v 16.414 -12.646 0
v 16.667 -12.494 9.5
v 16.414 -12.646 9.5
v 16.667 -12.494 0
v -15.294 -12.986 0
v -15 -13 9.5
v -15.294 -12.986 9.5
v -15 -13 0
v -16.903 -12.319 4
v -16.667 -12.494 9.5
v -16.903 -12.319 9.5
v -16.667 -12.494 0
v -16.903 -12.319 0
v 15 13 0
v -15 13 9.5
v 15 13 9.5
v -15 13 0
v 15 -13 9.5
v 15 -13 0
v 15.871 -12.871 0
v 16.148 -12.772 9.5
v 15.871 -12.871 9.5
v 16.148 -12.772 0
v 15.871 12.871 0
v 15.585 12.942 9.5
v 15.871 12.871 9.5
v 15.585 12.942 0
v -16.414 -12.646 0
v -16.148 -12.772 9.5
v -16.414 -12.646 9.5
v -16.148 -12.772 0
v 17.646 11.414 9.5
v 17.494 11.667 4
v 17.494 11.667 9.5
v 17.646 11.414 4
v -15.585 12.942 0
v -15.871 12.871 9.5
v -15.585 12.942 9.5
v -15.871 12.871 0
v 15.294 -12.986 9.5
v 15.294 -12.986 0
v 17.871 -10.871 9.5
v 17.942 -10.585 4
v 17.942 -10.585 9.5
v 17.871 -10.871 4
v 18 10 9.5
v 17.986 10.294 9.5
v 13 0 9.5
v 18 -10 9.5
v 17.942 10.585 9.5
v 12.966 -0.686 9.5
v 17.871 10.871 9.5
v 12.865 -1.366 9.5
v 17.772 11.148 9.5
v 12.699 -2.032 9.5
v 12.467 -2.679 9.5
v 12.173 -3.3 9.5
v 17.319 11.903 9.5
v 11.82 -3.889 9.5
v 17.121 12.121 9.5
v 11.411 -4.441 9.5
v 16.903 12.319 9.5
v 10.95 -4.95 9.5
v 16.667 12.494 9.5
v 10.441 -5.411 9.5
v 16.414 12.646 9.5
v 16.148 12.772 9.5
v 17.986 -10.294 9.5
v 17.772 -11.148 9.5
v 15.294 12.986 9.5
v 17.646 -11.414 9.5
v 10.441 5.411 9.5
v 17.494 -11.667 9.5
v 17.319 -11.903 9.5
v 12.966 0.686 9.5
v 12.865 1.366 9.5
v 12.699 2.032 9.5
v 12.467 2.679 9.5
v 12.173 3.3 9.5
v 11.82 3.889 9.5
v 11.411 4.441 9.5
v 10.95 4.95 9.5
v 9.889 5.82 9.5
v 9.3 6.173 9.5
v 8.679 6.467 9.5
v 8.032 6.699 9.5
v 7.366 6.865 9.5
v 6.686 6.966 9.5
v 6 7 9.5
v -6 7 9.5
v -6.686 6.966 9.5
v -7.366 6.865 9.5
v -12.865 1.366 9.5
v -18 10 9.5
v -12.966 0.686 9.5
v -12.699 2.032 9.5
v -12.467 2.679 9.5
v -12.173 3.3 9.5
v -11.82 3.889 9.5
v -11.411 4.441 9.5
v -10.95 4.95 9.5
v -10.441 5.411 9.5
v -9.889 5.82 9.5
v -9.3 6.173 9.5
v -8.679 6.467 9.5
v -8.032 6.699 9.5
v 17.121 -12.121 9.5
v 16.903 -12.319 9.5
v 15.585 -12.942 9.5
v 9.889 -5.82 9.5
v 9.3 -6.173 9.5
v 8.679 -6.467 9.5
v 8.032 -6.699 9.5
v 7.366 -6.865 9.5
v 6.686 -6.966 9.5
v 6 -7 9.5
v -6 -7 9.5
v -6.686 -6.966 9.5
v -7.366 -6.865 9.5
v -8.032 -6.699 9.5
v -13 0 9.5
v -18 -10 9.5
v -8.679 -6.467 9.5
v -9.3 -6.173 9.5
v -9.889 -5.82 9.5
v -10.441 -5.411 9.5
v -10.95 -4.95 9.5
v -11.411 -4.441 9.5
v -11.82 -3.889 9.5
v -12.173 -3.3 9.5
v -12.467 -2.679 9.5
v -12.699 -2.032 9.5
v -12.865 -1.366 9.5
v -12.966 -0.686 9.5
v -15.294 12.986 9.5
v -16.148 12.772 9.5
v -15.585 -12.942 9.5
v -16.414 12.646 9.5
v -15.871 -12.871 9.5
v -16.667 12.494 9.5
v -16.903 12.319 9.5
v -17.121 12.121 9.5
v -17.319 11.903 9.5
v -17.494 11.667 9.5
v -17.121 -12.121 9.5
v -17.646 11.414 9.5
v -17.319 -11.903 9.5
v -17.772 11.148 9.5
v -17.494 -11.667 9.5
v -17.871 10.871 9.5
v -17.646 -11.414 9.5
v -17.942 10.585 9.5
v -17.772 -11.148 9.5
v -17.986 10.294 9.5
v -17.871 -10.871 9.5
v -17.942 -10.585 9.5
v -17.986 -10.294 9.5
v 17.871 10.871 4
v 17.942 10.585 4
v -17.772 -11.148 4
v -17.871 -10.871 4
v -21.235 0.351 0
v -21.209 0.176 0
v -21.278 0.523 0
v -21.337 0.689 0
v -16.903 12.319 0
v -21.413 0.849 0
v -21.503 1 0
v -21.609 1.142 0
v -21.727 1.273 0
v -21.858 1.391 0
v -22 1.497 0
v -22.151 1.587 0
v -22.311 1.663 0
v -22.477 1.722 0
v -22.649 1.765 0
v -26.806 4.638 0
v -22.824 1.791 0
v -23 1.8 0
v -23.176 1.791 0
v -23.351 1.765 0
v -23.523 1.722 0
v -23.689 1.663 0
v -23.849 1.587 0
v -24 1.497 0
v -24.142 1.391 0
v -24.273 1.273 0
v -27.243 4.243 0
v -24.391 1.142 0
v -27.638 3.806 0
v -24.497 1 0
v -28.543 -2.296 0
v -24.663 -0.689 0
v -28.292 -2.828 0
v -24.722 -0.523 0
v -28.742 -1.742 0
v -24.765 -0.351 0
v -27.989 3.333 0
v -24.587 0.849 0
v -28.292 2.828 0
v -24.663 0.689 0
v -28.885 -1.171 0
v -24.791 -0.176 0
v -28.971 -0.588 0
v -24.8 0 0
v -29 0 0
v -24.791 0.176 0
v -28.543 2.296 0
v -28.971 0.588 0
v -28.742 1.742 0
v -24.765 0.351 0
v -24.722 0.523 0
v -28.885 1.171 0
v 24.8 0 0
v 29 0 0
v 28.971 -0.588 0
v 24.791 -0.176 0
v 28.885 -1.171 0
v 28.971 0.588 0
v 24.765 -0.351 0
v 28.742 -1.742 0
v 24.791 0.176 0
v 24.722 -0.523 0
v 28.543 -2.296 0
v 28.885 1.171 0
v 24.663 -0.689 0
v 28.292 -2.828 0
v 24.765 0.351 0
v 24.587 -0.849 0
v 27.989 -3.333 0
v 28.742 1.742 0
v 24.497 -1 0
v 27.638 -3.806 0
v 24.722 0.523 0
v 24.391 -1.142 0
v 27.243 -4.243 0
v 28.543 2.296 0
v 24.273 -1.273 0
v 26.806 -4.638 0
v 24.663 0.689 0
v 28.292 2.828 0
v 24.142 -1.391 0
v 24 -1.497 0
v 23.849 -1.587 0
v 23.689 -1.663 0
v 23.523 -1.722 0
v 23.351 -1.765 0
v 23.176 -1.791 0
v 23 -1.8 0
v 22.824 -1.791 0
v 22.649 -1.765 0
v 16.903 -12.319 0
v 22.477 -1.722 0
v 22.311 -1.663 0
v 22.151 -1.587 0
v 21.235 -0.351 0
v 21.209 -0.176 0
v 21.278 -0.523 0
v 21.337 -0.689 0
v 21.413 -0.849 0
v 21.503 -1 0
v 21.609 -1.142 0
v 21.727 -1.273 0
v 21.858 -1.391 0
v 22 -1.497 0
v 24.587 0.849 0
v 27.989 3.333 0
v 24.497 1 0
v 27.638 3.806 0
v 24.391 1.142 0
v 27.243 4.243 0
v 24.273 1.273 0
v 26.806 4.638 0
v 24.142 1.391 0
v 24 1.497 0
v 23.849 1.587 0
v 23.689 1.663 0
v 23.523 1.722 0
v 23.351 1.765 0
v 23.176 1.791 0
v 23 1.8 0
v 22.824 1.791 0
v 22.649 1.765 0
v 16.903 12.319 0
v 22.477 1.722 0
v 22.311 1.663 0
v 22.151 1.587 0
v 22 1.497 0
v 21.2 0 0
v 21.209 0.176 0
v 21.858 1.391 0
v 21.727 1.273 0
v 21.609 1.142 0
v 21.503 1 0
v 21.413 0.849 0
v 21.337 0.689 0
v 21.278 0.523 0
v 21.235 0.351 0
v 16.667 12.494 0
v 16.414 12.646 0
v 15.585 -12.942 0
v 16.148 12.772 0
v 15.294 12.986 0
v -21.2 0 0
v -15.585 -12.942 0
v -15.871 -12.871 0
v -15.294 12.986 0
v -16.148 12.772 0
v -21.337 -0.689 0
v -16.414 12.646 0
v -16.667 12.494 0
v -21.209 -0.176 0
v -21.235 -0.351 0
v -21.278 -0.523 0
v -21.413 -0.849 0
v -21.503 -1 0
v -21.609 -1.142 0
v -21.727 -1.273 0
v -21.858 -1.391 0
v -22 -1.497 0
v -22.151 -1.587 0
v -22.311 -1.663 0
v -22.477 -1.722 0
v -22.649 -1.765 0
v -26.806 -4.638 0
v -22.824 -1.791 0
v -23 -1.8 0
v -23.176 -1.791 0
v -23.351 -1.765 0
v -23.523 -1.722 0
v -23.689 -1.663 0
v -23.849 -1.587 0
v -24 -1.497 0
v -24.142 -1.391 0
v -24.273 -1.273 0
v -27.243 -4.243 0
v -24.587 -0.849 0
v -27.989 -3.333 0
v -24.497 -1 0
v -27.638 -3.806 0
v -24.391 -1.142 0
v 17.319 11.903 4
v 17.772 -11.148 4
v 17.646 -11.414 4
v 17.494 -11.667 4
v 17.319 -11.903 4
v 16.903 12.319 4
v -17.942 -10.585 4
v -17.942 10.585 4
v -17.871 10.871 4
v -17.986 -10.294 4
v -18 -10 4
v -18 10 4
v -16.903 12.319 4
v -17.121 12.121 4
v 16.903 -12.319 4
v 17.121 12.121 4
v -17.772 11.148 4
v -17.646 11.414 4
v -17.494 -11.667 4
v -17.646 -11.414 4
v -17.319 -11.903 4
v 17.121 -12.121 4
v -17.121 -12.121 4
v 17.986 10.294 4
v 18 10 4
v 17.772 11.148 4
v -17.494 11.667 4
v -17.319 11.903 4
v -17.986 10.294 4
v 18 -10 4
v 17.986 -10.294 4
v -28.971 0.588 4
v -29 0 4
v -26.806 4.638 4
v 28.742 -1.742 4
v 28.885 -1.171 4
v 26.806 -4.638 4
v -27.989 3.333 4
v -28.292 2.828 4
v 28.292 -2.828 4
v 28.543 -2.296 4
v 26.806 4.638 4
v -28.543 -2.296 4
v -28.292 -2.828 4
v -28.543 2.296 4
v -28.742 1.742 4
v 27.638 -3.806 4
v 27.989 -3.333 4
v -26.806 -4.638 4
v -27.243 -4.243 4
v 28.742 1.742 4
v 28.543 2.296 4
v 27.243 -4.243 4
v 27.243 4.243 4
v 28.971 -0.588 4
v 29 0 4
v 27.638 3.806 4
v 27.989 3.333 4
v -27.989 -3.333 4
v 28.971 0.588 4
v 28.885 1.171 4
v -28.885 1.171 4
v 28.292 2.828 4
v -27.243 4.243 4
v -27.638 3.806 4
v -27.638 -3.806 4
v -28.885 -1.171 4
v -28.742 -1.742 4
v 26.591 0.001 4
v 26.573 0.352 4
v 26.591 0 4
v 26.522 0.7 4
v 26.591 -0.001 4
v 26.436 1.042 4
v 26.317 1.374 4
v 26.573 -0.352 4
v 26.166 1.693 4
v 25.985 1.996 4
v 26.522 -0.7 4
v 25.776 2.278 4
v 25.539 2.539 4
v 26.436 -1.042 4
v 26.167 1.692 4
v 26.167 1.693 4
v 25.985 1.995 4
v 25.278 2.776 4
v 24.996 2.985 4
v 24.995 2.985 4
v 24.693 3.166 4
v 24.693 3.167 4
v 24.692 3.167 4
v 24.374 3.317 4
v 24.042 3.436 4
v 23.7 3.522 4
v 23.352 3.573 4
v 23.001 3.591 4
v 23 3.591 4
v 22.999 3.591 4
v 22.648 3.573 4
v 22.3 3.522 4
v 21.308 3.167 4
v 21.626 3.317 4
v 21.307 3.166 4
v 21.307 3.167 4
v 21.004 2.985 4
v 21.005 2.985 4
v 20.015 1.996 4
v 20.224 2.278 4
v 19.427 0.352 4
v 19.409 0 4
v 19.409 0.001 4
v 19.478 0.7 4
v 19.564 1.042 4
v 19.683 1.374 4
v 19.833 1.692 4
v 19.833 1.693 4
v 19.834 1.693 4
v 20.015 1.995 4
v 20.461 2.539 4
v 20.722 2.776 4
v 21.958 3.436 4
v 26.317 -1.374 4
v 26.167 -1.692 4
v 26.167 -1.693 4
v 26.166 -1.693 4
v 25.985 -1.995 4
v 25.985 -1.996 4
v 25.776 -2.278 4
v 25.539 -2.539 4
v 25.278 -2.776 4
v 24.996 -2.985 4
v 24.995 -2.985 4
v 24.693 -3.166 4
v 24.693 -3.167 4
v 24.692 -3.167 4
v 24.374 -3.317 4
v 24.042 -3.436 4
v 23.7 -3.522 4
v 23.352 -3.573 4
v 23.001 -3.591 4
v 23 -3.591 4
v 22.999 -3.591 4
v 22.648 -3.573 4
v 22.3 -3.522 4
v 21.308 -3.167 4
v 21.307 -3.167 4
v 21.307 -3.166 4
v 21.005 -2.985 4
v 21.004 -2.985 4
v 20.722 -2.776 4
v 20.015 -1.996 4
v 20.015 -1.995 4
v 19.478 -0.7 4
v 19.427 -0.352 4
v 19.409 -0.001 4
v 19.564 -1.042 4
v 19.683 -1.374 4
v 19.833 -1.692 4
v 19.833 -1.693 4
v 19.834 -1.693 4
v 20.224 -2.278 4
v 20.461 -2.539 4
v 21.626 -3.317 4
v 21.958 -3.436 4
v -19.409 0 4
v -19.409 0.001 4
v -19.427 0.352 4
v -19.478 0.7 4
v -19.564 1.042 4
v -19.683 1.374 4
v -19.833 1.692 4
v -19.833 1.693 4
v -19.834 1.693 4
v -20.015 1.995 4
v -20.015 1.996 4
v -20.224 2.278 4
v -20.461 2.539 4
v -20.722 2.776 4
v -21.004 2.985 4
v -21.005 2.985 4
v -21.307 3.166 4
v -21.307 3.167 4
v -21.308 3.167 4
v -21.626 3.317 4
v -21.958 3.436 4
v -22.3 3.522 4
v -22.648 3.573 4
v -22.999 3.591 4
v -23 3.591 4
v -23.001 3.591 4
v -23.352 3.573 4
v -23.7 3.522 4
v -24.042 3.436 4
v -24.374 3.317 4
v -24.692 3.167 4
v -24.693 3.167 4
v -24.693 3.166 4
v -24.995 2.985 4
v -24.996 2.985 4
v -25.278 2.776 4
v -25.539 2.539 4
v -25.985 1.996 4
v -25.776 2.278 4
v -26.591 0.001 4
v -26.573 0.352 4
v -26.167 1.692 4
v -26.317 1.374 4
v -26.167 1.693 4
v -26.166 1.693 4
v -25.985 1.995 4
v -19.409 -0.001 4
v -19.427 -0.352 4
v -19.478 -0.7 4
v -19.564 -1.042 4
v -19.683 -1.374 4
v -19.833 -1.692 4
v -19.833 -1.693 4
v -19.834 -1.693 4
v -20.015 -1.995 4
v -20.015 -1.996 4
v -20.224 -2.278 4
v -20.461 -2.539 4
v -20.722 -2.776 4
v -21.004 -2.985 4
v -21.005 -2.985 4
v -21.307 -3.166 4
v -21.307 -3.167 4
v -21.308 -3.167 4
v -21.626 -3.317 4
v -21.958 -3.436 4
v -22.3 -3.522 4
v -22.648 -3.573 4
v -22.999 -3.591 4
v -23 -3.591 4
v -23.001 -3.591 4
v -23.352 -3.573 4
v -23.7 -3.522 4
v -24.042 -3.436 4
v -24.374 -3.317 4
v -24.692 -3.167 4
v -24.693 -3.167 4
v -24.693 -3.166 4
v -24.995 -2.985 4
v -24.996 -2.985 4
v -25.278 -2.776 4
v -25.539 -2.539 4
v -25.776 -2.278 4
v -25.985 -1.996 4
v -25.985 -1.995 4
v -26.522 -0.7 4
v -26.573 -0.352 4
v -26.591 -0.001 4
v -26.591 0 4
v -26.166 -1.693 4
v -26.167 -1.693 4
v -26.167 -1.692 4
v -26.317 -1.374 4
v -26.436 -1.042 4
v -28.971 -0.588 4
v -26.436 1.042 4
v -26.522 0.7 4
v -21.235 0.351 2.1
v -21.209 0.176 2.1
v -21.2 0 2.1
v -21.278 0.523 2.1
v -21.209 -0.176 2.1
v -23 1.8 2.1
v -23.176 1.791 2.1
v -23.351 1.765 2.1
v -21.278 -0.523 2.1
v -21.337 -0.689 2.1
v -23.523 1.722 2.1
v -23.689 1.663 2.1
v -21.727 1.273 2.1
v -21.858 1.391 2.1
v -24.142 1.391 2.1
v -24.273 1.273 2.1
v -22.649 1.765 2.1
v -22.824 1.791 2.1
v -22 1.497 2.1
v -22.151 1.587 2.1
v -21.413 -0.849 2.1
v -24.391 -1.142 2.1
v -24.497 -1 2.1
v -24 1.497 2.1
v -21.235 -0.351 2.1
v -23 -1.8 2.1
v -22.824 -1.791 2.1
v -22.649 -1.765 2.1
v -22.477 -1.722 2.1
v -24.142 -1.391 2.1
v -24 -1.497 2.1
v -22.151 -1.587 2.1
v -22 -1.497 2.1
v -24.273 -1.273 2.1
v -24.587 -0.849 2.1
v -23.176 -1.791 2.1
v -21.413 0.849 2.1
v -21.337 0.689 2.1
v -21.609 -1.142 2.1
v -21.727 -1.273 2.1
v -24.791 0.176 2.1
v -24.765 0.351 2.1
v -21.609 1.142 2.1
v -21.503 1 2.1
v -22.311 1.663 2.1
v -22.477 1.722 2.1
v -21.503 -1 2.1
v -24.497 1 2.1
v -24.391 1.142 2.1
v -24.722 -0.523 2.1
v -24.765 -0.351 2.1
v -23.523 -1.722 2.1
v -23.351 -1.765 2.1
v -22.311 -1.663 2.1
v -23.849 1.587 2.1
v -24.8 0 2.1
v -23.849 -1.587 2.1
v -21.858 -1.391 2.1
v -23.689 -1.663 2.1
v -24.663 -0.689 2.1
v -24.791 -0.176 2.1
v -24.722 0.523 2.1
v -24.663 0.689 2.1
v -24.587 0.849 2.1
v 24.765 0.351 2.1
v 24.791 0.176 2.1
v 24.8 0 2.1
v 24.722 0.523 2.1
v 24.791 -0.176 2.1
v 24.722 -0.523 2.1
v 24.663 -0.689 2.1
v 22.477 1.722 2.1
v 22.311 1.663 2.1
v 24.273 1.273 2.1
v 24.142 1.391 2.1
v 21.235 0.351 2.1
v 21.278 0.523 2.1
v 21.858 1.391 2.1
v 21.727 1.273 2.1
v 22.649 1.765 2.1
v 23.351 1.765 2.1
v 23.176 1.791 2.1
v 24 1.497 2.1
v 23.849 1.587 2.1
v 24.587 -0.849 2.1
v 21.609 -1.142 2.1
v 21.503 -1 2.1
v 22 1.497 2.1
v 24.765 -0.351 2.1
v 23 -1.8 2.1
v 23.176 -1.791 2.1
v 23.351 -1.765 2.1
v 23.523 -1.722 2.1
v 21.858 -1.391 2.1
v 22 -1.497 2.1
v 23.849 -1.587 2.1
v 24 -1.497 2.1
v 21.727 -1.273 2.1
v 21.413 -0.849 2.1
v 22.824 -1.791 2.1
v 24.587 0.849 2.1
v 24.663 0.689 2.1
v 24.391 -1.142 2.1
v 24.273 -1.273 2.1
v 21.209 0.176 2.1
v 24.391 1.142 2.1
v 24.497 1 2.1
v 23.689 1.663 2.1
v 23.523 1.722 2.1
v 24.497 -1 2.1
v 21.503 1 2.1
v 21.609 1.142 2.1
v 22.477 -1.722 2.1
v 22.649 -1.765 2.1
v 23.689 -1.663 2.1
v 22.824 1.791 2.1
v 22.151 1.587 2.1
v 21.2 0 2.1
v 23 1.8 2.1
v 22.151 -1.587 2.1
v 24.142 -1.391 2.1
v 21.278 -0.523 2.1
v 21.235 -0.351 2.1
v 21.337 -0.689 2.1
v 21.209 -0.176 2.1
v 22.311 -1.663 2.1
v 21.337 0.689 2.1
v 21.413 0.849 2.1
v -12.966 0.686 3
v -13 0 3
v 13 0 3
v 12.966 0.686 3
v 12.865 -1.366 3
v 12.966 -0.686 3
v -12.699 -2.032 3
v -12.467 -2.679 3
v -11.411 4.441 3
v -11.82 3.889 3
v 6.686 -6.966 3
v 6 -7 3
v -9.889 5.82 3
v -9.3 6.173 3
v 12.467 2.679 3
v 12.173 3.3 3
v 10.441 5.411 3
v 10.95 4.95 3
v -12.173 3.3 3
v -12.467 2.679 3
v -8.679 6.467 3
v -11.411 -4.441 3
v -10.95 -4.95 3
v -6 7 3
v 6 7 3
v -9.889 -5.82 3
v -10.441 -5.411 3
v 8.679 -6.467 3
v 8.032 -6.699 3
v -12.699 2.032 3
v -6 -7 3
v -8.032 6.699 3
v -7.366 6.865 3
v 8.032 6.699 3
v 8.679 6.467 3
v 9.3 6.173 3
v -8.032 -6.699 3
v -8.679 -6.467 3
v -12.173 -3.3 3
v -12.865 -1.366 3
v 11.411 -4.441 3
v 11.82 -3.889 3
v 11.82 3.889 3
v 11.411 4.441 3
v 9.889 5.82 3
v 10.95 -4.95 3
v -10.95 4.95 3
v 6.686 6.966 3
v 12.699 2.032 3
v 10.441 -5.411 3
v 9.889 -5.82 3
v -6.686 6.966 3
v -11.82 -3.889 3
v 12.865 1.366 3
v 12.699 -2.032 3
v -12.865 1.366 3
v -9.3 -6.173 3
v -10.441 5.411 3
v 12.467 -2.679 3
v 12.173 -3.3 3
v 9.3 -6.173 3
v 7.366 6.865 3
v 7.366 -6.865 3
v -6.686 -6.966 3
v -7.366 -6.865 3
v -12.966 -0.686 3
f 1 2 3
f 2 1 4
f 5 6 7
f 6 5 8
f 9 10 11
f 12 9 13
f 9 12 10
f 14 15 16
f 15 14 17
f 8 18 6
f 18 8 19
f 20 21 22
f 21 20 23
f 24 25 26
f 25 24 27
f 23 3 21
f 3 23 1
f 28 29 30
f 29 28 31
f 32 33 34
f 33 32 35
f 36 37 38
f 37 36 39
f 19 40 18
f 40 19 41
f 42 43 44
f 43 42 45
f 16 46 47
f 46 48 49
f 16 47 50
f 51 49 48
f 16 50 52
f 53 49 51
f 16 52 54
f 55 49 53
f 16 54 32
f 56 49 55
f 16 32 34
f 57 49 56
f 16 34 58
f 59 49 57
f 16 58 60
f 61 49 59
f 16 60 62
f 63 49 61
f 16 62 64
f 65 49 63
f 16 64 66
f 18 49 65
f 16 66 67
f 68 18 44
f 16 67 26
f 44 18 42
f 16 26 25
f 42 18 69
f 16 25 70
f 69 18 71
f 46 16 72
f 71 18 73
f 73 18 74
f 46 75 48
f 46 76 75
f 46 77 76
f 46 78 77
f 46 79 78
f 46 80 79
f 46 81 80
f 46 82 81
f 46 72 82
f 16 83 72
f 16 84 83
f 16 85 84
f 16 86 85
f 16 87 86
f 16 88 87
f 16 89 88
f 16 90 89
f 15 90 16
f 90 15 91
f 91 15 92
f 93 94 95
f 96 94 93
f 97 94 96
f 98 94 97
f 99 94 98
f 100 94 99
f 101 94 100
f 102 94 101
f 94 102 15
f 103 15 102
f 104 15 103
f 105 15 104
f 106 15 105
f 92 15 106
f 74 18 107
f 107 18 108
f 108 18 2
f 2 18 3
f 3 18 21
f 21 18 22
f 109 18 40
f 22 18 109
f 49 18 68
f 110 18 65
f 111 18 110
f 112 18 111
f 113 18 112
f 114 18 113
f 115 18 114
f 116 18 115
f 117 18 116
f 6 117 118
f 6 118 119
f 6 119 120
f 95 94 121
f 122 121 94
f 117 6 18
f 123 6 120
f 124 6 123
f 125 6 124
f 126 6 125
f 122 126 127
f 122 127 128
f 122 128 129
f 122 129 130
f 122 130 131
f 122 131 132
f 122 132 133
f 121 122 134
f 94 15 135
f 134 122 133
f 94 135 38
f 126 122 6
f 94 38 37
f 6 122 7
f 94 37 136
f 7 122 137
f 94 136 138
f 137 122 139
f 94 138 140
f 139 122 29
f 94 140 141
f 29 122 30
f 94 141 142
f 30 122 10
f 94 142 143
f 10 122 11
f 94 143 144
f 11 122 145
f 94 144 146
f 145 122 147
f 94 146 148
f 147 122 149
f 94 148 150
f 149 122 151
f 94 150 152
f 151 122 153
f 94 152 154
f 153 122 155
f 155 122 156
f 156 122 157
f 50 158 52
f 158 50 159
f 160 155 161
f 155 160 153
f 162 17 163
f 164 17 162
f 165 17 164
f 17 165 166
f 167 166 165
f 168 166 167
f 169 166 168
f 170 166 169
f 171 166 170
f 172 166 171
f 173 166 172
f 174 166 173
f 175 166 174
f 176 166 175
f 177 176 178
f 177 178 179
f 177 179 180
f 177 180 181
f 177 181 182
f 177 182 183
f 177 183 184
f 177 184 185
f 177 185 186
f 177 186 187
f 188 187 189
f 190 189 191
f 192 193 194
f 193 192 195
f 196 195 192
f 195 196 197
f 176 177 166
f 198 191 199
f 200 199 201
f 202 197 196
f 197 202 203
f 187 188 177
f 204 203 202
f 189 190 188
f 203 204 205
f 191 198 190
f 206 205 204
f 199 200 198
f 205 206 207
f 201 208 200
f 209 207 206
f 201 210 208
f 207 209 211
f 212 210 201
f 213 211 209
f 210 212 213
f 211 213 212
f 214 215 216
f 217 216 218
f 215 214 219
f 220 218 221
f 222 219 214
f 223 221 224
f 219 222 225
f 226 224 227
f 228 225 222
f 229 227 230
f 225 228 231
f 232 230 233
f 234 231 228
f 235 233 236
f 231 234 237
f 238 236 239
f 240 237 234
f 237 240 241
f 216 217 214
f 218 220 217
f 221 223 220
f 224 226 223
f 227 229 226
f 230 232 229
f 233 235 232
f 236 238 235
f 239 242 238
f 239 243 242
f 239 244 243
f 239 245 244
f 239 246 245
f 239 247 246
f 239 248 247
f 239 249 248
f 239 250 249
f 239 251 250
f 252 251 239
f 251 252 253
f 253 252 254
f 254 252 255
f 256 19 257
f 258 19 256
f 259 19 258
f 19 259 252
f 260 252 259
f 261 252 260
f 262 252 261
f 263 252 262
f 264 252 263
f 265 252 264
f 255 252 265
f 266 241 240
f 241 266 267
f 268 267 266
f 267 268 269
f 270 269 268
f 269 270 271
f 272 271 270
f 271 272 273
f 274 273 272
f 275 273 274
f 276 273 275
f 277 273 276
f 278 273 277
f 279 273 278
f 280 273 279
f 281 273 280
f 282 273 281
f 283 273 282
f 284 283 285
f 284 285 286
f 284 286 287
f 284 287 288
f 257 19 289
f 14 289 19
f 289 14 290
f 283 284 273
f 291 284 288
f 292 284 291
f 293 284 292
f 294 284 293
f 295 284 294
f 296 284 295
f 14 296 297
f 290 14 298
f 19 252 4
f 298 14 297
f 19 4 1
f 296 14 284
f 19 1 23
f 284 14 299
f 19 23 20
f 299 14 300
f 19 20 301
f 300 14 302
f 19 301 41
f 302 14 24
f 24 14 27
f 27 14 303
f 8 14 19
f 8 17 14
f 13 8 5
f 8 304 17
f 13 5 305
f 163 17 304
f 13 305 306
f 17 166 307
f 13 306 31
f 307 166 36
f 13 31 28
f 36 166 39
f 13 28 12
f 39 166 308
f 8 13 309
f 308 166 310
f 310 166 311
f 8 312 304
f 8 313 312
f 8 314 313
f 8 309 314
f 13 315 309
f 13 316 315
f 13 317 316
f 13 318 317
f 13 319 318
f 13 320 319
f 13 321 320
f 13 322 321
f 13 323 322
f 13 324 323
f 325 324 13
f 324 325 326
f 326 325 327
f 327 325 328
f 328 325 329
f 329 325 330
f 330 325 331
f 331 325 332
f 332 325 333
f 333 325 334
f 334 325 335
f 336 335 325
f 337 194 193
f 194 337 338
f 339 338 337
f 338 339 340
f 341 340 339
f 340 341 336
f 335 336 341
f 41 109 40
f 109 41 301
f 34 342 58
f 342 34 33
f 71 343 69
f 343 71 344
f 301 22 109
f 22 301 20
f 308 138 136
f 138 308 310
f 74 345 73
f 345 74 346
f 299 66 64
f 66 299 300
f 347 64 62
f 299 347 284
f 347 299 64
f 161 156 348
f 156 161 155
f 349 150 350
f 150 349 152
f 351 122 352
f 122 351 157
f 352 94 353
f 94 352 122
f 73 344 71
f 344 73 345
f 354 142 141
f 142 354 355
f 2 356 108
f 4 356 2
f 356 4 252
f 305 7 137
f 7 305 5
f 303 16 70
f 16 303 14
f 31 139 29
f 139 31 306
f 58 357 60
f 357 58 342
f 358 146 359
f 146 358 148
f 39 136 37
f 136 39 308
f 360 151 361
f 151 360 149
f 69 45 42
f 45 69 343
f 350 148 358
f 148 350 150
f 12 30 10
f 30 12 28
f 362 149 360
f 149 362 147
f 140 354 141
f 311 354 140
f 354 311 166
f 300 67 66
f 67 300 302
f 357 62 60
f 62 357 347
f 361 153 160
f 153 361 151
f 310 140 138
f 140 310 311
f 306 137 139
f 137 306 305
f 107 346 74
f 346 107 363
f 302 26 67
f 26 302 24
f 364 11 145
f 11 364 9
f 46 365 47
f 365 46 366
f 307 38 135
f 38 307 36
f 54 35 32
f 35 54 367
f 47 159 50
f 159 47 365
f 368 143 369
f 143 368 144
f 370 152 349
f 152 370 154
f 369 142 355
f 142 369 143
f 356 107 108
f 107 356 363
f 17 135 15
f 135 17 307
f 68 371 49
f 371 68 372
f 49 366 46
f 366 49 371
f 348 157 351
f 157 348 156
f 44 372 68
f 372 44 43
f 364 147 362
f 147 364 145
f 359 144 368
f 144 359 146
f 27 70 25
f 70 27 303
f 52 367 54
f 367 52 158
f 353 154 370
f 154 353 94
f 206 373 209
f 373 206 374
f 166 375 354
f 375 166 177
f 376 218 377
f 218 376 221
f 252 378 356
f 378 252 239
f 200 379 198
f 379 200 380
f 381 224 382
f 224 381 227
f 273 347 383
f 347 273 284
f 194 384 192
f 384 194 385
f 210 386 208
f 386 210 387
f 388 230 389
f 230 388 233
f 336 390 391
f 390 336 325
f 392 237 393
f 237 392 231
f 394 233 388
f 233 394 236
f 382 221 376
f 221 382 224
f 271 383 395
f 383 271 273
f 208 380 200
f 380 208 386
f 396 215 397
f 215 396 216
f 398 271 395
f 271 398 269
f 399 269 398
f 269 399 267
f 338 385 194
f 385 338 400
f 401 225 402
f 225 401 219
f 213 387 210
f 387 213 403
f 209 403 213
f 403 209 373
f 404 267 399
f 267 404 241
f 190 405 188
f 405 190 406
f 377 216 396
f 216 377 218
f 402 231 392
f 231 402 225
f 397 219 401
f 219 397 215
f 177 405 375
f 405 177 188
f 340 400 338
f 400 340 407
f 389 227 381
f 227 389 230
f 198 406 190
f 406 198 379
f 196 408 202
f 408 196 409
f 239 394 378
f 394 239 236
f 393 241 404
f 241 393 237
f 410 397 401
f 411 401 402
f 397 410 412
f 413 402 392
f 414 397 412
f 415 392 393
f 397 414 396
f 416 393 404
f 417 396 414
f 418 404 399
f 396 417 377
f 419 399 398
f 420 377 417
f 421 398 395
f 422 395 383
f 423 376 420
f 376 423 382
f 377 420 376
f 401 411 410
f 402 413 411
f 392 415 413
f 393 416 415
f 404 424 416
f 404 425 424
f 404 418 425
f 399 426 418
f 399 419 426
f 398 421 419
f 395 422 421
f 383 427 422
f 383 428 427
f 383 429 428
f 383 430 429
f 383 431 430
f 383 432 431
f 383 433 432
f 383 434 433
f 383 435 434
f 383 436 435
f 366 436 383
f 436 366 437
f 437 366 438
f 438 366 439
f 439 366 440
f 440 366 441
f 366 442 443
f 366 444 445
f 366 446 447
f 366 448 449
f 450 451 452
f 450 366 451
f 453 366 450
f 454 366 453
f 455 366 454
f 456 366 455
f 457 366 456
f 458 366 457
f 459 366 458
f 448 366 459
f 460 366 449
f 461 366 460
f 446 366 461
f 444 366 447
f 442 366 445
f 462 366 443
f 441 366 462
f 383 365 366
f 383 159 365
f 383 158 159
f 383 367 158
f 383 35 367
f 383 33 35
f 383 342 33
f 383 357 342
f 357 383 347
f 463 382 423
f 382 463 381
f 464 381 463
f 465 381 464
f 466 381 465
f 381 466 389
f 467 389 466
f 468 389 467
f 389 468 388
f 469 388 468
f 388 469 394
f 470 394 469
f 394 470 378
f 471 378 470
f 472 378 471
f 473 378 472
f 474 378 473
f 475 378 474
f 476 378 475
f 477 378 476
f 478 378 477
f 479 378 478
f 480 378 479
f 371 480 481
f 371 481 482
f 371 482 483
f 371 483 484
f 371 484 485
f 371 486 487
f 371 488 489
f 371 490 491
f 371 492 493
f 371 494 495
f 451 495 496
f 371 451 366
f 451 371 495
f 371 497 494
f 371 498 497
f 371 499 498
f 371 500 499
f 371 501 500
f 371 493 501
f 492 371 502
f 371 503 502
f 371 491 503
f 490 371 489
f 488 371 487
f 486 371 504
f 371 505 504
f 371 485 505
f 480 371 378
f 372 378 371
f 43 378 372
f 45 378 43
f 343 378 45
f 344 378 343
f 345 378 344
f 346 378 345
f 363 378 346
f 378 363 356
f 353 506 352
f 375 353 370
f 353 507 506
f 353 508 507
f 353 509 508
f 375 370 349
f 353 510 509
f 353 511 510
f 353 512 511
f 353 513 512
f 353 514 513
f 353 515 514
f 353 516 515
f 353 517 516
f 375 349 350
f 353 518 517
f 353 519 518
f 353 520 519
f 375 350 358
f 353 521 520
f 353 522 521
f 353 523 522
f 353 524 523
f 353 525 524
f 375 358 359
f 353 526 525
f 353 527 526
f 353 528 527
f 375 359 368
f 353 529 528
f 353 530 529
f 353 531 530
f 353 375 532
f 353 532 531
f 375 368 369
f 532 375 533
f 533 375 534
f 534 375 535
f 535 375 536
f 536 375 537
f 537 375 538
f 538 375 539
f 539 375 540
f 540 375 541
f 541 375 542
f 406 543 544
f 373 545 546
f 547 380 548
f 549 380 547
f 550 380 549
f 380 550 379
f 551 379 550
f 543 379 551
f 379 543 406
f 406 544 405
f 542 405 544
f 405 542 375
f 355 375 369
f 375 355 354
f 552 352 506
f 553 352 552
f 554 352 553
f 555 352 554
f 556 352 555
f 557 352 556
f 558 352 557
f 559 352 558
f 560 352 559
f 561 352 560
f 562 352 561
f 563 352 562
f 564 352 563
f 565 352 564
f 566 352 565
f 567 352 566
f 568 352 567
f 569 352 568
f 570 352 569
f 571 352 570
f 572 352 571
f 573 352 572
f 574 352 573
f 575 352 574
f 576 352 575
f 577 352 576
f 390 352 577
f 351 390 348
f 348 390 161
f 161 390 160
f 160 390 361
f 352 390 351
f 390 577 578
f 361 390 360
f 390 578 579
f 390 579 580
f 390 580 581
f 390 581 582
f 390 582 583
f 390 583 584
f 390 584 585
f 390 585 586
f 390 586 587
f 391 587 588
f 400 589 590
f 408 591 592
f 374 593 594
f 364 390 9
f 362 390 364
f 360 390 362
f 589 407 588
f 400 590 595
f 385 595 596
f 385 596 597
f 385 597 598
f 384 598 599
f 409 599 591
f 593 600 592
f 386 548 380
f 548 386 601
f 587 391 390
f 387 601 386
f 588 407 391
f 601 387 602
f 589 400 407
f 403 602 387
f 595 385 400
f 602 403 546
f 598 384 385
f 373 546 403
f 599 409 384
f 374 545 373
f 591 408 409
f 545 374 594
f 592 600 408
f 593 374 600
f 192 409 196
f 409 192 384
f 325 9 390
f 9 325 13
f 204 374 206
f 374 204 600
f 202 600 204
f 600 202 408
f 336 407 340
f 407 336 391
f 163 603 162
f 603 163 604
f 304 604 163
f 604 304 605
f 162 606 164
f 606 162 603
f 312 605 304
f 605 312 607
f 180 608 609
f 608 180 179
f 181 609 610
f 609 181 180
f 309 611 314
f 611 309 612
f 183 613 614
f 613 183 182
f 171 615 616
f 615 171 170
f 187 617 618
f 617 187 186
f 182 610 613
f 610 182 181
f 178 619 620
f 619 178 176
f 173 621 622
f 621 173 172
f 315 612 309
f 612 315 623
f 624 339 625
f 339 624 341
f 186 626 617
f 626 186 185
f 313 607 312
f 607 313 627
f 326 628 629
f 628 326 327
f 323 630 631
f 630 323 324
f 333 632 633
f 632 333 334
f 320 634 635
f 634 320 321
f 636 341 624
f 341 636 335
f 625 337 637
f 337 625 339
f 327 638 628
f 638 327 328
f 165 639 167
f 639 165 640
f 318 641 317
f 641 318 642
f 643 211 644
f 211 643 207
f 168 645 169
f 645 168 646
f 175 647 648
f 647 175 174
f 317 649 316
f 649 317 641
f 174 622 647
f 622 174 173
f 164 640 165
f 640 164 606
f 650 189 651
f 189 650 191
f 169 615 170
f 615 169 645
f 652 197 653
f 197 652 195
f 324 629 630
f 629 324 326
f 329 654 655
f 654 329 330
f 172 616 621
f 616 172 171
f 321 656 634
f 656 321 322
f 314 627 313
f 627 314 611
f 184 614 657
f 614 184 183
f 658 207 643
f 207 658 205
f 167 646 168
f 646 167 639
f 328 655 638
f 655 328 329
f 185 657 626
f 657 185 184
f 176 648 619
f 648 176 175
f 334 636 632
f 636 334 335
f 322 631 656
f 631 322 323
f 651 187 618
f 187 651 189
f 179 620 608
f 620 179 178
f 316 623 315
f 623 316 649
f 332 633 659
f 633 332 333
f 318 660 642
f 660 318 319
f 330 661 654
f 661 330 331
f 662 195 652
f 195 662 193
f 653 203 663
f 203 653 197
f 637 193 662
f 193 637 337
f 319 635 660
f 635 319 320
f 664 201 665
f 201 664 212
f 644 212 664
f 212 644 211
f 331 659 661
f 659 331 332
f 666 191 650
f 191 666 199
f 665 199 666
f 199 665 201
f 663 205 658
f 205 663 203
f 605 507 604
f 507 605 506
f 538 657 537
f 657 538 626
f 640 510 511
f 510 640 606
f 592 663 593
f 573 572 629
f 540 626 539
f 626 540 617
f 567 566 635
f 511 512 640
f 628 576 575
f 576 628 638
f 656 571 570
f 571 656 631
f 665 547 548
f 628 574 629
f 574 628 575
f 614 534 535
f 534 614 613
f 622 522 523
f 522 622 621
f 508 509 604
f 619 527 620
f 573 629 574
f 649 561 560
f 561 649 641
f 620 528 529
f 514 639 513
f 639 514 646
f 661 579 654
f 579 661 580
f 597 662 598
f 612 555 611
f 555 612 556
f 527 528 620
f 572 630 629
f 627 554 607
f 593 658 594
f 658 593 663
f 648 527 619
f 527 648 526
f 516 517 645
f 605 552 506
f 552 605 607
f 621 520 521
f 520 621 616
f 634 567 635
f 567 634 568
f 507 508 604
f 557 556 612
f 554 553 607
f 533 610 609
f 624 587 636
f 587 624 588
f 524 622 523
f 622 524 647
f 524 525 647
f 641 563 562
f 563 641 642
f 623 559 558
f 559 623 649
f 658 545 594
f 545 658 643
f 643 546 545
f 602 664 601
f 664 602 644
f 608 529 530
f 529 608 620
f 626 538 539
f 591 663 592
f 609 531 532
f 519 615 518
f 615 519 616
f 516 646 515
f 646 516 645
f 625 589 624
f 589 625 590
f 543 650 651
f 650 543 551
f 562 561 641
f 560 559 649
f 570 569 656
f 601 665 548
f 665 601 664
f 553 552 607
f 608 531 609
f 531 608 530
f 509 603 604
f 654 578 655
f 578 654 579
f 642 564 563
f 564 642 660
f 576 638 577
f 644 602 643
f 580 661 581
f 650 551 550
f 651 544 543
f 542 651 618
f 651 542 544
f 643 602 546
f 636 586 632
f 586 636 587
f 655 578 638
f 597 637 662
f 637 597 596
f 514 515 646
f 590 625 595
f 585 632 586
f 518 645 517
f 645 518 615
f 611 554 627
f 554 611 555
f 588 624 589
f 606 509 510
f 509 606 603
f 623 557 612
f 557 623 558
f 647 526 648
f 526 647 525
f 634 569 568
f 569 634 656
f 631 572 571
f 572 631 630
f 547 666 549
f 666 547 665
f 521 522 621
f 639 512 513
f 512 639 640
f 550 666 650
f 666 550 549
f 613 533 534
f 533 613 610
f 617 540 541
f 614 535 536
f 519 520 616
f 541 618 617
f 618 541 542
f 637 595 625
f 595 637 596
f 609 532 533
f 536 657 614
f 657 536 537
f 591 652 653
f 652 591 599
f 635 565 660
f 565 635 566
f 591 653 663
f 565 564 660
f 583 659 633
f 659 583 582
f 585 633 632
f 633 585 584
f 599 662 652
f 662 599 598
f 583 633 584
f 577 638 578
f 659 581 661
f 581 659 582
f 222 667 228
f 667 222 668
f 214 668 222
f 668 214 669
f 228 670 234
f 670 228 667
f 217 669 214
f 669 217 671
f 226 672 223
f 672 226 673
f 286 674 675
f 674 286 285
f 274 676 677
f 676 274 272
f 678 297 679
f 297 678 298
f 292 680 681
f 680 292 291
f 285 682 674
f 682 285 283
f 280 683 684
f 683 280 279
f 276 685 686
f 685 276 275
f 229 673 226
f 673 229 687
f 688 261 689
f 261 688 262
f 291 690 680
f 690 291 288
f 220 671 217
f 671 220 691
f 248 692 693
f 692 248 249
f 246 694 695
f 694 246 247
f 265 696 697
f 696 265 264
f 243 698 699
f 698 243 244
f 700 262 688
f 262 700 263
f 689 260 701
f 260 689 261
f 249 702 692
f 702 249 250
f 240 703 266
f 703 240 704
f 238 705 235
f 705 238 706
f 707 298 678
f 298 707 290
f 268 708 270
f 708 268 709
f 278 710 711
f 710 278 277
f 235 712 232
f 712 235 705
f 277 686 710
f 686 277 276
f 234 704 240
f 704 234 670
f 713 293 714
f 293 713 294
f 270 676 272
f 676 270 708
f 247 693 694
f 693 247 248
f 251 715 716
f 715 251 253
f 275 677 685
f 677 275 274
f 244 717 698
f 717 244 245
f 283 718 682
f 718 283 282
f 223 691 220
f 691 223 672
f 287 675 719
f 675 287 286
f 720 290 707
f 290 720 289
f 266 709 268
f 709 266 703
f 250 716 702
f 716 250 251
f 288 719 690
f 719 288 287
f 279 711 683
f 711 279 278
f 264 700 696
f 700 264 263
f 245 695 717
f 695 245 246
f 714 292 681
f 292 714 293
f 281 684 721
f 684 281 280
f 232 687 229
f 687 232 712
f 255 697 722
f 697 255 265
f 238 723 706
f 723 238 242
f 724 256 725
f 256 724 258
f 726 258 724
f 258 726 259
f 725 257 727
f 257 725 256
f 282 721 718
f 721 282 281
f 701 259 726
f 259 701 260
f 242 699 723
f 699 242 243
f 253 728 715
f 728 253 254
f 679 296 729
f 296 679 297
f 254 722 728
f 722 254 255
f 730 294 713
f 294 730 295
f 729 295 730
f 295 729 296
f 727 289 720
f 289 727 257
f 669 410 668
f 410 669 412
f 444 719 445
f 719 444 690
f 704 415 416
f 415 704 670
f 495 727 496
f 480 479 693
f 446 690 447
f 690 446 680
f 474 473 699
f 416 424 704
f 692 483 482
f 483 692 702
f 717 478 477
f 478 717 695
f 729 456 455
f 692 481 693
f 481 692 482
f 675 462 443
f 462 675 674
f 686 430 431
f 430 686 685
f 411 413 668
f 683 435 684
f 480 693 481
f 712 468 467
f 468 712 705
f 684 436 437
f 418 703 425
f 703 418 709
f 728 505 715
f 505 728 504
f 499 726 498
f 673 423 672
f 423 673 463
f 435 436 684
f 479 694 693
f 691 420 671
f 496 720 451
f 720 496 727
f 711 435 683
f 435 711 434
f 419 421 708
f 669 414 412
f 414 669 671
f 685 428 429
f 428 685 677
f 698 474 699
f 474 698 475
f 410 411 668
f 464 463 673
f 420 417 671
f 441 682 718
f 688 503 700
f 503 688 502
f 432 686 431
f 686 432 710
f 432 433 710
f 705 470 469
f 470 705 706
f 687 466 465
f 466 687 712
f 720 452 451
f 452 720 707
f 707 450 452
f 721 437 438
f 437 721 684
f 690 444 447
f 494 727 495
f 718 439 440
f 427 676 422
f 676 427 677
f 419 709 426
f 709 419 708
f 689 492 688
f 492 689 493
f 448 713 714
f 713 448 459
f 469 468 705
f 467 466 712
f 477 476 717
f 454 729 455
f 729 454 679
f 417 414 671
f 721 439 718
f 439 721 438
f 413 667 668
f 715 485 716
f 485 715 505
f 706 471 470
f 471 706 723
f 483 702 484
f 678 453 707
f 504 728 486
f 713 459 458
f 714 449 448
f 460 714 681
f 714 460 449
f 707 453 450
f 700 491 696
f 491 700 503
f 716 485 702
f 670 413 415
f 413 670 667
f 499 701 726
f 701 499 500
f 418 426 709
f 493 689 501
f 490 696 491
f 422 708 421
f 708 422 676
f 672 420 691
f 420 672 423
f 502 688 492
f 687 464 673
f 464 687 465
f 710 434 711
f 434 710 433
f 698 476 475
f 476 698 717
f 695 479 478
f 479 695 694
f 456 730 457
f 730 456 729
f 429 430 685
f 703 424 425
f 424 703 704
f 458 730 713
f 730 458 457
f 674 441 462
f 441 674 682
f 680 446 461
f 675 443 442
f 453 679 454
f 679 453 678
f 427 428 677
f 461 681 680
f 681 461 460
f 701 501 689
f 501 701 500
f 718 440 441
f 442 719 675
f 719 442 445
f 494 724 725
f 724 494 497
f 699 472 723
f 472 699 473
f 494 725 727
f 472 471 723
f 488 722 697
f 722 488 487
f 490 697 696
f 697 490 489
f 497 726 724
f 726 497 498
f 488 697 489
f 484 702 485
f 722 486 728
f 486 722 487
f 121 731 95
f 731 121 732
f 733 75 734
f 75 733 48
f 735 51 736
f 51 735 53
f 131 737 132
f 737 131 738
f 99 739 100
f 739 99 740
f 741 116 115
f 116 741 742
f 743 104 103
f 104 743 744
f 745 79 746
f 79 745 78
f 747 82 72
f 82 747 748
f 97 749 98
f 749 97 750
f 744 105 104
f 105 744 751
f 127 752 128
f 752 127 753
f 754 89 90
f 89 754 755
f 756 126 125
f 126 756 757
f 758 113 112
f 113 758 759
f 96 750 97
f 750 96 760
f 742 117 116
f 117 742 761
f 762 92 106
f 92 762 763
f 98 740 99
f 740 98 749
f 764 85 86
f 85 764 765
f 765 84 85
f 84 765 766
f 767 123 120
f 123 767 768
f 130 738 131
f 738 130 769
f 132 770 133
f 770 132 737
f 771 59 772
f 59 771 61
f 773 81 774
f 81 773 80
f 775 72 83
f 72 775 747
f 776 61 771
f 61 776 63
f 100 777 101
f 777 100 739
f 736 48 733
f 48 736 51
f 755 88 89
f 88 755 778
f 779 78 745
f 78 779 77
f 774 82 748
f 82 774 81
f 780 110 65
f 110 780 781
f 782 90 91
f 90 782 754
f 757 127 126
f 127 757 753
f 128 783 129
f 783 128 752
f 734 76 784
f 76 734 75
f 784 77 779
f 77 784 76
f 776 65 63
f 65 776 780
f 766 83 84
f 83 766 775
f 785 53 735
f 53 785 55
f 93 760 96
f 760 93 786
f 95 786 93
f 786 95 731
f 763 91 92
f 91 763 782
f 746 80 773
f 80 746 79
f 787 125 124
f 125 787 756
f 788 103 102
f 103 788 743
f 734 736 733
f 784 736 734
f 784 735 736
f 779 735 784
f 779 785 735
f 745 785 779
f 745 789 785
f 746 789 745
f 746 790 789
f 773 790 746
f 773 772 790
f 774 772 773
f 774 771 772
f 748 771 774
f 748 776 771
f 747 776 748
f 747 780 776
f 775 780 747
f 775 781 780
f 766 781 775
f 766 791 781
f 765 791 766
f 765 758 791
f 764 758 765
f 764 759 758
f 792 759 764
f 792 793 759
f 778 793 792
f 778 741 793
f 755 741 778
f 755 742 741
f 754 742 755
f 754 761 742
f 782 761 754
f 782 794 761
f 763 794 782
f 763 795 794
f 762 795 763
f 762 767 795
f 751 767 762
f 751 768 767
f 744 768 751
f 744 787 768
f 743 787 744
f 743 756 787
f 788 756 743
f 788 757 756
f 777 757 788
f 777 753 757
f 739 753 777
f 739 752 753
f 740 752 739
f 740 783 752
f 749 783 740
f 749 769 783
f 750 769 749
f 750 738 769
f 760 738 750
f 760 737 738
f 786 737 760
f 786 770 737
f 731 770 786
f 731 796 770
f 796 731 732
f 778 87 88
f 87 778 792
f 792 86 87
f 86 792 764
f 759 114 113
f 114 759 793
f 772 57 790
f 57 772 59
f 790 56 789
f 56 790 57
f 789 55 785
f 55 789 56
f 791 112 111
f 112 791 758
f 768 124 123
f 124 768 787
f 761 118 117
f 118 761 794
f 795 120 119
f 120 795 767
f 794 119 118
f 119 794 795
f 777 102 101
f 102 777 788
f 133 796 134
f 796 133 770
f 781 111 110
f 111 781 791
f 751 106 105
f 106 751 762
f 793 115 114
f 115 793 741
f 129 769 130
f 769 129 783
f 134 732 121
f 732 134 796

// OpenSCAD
// file: keyhole_hanger_002.scad
// keyhole_hanger_002.scad
// Two-part wall hanger set for a wooden board.
//
//   Part A - keyhole plate. Carries the load, sets the height,
//            traps the nail head so the board can't be pulled off.
//   Part B - stabilizer plate. Open channel, no retaining lip.
//            Stops the board rotating around A's nail and holds that
//            end flat to the wall. Deliberately forgiving: the nail can
//            sit anywhere in a wide window, so it never fights part A.
//
// Both parts are the same total thickness, so the board sits flat.
//
// Orientation when installed:
//   z = 0        flat face, screwed against the board
//   z = total_t  face toward the wall

$fn = 64;
eps = 0.01;

// "A", "B", or "both" (both = side by side, for preview only)
part = "both";

/* ---- shared stack ---- */
web_t = 3.0;      // solid layer against the wood
cav_t = 4.0;      // nail-head clearance
lip_t = 2.5;      // retaining lip / channel mouth
total_t = web_t + cav_t + lip_t;   // 9.5

corner_r = 3;

/* ---- shared mounting ears ---- */
ear_r      = 6;
ear_t      = 4.0;
screw_d    = 3.6;            // #6 wood screw shank
csink_d    = 7.2;
csink_deep = 1.9;

/* ---- part A: keyhole ---- */
a_body_w = 26;
a_body_h = 34;
a_ear_cx = a_body_w/2 + 5;   // 18
head_d   = 13.0;             // clearance dia for the nail head
shank_w  =  5.0;             // slot width (nail shank + clearance)
hole_y   = -8;               // centre of the big entry opening
slot_y   =  8;               // top of slot = where the nail carries the load

/* ---- part B: stabilizer ---- */
b_body_w  = 36;
b_body_h  = 26;
b_ear_cx  = b_body_w/2 + 5;  // 23
chan_w    = 26;              // lateral tolerance for the second nail
chan_h    = 14;              // vertical tolerance (never load-bearing)

/* ---------------- shared helpers ---------------- */

module rrect2d(w, h, r) {
    offset(r = r) square([w - 2*r, h - 2*r], center = true);
}

module foot2d(body_w, body_h, ear_cx) {
    hull() {
        rrect2d(body_w, body_h, corner_r);
        for (s = [-1, 1]) translate([s * ear_cx, 0]) circle(r = ear_r);
    }
}

// body + ears, before any openings are cut
module blank(body_w, body_h, ear_cx) {
    union() {
        linear_extrude(total_t) rrect2d(body_w, body_h, corner_r);
        linear_extrude(ear_t)   foot2d(body_w, body_h, ear_cx);
    }
}

// countersunk screw holes, heads on the wall-facing side of the ears
module screws(ear_cx) {
    for (s = [-1, 1]) translate([s * ear_cx, 0, 0]) {
        translate([0, 0, -eps])
            cylinder(d = screw_d, h = ear_t + 2*eps);
        translate([0, 0, ear_t - csink_deep])
            cylinder(d1 = screw_d, d2 = csink_d, h = csink_deep + eps);
    }
}

/* ---------------- part A: keyhole plate ---------------- */

// cavity the nail head slides through, behind the lip
module a_cavity2d() {
    hull() {
        translate([0, hole_y]) circle(d = head_d);
        translate([0, slot_y]) circle(d = head_d);
    }
}

// opening cut through the lip: full-size entry hole + narrow slot above it
module a_opening2d() {
    translate([0, hole_y]) circle(d = head_d);
    hull() {
        translate([0, hole_y]) circle(d = shank_w);
        translate([0, slot_y]) circle(d = shank_w);
    }
}

module part_A() {
    difference() {
        blank(a_body_w, a_body_h, a_ear_cx);

        // nail-head cavity (sealed except through the lip opening)
        translate([0, 0, web_t])
            linear_extrude(cav_t) a_cavity2d();

        // keyhole through the lip
        translate([0, 0, web_t + cav_t - eps])
            linear_extrude(lip_t + 2*eps) a_opening2d();

        screws(a_ear_cx);
    }
}

/* ---------------- part B: stabilizer plate ---------------- */

module b_channel2d() {
    r = chan_h / 2;
    hull()
        for (s = [-1, 1]) translate([s * (chan_w/2 - r), 0]) circle(r = r);
}

module part_B() {
    difference() {
        blank(b_body_w, b_body_h, b_ear_cx);

        // open channel straight through cavity + lip, floored by the web
        translate([0, 0, web_t])
            linear_extrude(cav_t + lip_t + eps) b_channel2d();

        screws(b_ear_cx);
    }
}

/* ---------------- output ---------------- */

if (part == "A")    part_A();
else if (part == "B") part_B();
else {
    translate([-28, 0, 0]) part_A();
    translate([ 34, 0, 0]) part_B();
}
// main file
// Print wrapper: part B (stabilizer plate) from keyhole_hanger_002.scad
use <keyhole_hanger_002.scad>
part_B();
